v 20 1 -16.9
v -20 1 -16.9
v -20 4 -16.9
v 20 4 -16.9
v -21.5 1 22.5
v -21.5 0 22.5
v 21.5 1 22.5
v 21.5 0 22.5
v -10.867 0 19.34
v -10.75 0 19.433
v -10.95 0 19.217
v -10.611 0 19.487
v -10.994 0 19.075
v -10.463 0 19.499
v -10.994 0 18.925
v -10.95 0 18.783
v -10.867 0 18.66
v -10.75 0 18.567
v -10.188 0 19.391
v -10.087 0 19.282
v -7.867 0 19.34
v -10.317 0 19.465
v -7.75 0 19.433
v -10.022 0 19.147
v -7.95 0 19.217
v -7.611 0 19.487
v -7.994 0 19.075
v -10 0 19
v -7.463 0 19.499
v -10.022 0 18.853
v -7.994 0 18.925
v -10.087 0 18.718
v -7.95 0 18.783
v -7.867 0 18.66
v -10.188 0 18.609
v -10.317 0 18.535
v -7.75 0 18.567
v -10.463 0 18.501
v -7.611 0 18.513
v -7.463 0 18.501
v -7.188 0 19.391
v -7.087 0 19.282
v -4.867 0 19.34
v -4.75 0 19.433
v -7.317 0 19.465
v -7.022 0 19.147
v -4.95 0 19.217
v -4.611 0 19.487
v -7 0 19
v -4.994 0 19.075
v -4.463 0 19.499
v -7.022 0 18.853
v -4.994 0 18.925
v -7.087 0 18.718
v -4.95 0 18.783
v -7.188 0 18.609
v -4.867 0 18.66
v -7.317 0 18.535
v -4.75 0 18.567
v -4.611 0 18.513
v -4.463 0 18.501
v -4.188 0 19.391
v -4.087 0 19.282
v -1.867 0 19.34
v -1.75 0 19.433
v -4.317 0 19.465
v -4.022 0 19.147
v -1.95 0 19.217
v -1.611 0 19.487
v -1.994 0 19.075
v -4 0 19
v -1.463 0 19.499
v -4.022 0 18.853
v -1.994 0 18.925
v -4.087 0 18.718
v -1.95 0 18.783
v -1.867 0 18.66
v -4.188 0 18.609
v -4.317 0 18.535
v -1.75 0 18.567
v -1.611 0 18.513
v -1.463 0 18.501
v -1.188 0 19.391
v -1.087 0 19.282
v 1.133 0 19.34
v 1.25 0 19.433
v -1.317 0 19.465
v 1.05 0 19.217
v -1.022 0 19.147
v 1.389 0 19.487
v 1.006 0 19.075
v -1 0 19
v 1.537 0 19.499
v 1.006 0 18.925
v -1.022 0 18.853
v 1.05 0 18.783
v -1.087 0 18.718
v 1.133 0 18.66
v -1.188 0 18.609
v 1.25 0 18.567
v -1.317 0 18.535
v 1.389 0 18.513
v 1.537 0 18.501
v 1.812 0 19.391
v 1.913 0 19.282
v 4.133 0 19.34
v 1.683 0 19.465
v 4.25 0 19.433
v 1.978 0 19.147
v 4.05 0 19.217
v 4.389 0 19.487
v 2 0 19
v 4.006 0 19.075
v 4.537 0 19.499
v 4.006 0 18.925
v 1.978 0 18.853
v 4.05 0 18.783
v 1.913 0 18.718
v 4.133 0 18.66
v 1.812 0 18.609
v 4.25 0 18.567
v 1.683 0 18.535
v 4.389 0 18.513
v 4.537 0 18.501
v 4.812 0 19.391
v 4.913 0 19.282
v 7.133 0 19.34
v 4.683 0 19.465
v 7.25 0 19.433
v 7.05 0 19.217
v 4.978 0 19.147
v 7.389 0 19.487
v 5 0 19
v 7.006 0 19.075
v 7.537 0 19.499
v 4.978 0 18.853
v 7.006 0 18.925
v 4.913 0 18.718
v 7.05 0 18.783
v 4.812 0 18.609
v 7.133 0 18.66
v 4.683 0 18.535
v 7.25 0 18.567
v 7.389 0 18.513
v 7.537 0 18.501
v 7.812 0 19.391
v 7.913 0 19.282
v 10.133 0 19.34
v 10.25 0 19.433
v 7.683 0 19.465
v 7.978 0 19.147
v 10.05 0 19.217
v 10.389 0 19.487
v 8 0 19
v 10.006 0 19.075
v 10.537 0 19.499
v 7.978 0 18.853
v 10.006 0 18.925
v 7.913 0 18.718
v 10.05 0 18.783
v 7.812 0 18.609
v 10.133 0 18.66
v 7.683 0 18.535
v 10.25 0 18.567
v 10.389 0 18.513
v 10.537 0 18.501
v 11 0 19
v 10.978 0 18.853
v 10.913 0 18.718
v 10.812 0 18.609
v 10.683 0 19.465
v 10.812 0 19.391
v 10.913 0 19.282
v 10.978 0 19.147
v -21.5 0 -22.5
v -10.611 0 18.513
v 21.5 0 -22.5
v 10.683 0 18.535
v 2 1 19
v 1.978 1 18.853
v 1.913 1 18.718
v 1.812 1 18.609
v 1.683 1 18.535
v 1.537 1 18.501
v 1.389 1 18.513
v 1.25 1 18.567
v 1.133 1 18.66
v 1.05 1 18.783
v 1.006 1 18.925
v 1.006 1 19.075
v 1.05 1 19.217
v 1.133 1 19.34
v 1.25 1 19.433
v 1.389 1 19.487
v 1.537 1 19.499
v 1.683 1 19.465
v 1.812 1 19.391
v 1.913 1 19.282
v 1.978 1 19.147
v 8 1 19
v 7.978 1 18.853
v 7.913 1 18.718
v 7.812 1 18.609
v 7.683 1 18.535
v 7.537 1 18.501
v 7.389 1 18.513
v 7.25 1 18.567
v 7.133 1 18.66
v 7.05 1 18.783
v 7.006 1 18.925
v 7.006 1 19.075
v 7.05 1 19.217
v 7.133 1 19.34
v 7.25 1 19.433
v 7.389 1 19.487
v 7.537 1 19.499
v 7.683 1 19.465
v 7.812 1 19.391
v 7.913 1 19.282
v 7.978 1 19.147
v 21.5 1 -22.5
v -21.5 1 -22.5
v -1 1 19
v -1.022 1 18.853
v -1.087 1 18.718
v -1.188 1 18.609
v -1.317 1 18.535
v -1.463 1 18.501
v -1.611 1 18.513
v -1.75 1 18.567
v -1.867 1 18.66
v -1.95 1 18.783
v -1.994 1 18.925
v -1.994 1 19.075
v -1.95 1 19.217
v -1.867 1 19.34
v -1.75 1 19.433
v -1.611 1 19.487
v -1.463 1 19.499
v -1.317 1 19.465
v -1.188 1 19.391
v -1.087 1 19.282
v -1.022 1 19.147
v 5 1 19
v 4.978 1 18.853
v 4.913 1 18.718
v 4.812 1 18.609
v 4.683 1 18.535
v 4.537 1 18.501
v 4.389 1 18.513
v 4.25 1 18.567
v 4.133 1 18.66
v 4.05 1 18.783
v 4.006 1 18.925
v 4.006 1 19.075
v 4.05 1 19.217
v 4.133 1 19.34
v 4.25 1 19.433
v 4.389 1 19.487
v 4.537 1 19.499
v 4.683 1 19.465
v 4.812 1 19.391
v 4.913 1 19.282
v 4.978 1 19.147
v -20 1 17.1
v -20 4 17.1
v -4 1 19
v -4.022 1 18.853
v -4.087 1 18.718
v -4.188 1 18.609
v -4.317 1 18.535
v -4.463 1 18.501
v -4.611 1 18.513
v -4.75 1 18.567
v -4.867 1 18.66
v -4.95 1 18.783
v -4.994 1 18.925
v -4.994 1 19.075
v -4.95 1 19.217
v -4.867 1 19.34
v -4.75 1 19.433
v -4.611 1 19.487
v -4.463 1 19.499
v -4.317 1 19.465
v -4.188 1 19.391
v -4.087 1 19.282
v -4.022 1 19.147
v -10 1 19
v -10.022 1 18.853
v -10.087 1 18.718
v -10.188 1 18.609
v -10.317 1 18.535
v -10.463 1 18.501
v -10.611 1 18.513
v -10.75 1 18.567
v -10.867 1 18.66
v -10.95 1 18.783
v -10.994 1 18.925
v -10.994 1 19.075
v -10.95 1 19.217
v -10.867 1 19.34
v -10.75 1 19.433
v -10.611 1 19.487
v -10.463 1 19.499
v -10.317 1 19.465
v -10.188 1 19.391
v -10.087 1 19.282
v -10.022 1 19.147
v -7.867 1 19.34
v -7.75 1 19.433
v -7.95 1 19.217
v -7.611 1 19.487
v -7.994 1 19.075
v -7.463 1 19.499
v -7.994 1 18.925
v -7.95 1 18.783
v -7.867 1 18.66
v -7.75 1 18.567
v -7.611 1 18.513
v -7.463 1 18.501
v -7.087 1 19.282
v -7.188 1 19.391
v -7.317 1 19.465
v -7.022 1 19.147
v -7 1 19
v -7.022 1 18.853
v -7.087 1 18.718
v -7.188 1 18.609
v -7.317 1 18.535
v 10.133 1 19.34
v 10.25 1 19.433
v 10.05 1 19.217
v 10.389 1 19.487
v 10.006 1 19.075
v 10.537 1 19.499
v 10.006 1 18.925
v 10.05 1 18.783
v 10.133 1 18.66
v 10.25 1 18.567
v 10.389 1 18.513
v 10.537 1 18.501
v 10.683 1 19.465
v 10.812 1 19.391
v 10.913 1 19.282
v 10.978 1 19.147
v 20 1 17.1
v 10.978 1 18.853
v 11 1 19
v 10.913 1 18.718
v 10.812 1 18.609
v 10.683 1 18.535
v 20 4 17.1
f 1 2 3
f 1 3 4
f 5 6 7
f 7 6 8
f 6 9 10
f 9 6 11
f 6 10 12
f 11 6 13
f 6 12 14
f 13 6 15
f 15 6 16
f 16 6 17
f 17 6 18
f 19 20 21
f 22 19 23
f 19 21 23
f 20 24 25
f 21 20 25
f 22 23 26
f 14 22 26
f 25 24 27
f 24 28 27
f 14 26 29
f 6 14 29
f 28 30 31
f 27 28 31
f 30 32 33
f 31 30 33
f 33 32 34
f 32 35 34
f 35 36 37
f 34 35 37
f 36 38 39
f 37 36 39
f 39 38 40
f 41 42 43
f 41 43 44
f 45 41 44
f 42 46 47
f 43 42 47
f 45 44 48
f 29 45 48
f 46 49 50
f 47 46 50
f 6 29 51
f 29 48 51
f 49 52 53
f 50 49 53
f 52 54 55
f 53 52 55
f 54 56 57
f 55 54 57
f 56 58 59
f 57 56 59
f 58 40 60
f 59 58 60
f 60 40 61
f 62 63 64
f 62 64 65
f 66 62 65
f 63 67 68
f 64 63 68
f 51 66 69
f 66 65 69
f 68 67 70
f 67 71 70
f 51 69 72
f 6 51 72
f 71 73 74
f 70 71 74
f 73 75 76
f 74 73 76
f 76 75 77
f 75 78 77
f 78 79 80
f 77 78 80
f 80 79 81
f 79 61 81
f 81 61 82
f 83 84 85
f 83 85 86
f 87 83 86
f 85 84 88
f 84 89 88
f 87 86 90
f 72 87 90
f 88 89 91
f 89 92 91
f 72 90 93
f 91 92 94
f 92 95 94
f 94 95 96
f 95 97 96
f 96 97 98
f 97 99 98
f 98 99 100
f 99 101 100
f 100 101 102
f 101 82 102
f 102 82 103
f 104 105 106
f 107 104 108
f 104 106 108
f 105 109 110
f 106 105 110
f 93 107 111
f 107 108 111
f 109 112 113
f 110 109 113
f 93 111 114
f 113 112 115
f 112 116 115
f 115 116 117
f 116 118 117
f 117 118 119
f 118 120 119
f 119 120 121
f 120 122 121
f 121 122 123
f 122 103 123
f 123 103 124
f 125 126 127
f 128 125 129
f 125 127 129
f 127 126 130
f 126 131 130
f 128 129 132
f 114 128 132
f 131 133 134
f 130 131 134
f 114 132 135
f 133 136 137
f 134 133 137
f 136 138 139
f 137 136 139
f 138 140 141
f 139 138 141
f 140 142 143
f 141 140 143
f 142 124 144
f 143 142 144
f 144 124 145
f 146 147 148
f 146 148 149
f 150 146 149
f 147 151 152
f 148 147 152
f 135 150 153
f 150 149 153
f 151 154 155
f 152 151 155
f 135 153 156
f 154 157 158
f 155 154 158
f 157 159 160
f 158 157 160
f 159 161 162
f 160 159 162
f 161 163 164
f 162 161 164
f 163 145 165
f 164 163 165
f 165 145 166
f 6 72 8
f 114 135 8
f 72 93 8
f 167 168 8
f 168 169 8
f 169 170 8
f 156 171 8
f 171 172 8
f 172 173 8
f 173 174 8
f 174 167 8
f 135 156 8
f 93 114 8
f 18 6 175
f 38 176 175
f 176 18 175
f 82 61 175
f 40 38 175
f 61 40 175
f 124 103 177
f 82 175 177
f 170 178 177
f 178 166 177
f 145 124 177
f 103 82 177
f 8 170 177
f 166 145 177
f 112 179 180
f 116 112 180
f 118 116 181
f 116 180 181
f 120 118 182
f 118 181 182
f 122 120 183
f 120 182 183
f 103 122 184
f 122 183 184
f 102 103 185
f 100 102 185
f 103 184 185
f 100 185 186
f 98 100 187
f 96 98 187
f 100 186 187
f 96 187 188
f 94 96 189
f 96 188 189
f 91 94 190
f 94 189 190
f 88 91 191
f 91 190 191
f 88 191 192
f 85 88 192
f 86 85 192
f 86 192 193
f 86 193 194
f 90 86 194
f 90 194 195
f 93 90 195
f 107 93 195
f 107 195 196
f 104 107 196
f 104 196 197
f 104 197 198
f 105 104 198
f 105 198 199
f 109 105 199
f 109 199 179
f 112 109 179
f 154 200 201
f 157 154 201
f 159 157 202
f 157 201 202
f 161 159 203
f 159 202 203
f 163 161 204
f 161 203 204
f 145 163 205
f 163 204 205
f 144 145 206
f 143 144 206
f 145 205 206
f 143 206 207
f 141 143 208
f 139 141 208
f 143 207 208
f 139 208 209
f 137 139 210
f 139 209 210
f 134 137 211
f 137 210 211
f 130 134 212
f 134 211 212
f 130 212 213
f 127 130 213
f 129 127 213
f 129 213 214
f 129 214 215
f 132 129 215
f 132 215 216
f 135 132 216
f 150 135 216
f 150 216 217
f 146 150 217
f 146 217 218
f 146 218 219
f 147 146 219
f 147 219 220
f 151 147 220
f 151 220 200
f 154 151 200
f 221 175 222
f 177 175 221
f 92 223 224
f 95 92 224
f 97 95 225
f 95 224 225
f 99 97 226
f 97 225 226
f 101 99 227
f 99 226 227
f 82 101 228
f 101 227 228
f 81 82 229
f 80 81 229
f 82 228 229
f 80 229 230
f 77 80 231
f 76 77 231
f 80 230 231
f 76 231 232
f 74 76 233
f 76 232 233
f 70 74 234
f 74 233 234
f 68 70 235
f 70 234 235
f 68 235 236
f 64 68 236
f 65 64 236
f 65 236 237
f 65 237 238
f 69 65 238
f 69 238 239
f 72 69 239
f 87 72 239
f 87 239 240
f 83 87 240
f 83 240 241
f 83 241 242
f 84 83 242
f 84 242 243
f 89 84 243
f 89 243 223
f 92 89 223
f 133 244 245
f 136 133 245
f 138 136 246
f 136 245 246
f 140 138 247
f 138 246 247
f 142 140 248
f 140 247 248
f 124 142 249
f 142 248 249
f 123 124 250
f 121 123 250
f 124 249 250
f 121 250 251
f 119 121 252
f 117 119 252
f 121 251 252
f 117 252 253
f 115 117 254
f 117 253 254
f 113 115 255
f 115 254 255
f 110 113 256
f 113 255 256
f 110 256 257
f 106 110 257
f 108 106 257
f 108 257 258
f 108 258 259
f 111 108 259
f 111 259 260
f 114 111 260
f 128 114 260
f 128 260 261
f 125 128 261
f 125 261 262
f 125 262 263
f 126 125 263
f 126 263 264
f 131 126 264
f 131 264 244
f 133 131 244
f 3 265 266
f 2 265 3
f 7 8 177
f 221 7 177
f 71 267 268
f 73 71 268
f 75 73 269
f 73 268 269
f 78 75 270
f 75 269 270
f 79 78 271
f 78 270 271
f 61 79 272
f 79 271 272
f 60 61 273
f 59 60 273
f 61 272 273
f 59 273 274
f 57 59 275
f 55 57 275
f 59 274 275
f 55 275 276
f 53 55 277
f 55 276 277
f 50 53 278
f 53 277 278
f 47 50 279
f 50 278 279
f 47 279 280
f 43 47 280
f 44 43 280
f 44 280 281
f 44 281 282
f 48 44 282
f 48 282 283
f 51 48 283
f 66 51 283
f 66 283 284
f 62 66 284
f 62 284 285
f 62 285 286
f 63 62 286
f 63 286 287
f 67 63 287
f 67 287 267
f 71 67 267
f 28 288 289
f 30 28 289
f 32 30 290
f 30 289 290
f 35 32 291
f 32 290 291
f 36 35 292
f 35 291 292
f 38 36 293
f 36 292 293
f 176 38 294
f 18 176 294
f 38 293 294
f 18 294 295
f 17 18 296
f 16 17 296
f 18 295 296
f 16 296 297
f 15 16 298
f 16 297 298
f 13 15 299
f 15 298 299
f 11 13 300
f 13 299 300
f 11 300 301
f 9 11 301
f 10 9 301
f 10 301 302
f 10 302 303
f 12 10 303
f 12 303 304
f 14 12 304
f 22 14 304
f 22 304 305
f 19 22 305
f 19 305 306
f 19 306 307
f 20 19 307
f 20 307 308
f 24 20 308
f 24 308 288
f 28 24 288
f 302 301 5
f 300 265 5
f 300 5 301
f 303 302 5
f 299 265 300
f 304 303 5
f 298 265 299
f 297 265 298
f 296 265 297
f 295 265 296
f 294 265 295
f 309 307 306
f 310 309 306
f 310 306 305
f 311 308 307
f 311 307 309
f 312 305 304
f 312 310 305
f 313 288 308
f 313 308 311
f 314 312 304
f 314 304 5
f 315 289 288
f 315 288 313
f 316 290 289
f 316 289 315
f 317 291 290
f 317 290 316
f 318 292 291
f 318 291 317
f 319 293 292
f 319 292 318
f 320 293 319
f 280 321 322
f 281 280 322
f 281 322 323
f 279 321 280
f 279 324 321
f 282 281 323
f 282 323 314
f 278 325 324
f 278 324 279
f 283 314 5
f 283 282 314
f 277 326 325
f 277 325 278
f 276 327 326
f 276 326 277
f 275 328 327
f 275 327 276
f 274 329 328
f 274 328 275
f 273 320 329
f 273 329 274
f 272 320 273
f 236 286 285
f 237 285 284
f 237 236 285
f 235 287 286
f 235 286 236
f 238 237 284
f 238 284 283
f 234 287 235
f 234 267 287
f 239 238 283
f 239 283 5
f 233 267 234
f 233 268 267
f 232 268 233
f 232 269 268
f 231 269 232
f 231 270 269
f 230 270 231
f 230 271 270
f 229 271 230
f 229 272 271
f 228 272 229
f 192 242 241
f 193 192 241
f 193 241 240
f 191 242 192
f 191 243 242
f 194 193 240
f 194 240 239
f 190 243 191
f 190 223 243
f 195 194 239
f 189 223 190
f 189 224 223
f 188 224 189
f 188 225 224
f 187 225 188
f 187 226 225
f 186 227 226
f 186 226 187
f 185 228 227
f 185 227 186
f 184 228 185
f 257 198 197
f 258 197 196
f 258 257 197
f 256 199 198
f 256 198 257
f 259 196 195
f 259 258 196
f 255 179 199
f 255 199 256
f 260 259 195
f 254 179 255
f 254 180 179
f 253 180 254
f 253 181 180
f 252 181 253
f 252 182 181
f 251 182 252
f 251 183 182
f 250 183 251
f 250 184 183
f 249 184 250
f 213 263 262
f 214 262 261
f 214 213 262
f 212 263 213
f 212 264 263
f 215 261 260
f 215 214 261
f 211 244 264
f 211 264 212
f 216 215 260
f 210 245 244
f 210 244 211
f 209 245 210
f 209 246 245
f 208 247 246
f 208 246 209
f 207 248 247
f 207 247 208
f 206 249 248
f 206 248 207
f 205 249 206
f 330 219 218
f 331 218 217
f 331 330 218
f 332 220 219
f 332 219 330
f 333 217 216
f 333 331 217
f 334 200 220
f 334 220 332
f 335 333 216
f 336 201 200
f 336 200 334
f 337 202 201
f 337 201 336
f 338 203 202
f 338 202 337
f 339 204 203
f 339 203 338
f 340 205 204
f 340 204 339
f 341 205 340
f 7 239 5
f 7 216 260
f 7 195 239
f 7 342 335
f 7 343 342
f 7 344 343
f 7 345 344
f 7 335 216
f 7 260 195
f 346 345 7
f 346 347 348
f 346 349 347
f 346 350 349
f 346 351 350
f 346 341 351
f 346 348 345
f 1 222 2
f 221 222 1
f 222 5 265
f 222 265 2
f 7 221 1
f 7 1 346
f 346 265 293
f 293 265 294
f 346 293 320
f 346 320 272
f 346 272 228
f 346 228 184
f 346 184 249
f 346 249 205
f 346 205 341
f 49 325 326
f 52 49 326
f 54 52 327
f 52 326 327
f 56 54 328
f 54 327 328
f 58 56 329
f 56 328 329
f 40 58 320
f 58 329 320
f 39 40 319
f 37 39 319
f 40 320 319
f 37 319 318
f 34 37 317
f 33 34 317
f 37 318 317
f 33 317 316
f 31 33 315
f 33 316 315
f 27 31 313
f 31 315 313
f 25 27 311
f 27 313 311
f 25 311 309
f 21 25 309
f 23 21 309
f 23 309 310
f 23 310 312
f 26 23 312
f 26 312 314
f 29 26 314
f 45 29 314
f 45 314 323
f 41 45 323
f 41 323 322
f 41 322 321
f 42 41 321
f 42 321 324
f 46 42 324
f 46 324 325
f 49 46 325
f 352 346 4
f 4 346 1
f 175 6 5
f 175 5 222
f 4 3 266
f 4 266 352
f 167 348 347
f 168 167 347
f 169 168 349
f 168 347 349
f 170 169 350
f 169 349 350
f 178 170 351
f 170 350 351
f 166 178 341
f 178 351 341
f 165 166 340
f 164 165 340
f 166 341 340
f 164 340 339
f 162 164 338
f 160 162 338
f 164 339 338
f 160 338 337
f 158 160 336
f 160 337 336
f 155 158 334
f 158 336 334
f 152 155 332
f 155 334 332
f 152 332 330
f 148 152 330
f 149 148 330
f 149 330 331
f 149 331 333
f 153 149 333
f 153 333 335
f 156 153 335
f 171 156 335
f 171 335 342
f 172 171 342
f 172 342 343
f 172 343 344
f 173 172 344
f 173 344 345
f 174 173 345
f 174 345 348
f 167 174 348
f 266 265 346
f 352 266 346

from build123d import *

# Parameters (mm, degrees)
CROQUIS1_W              = 43
CROQUIS1_H              = 45
SALIENTE_EXTRUIR1_DEPTH = 1
CROQUIS2_W              = 40
CROQUIS2_H              = 34
SALIENTE_EXTRUIR2_DEPTH = 3
CROQUIS3_R              = 0.5
CORTAR_EXTRUIR1_DEPTH   = 2


with BuildPart() as part:
    # Croquis1 → Saliente-Extruir1 (new body)
    with BuildSketch(Plane(origin=(0, 0, 0), x_dir=(1, 0, 0), z_dir=(0, 1, 0))):
        Rectangle(CROQUIS1_W, CROQUIS1_H)
    extrude(amount=SALIENTE_EXTRUIR1_DEPTH)

    # Croquis2 → Saliente-Extruir2 (add)
    with BuildSketch(Plane(origin=(0, 1, 0), x_dir=(1, 0, 0), z_dir=(0, 1, 0))):
        with Locations((0, -0.1)):
            Rectangle(CROQUIS2_W, CROQUIS2_H)
    extrude(amount=SALIENTE_EXTRUIR2_DEPTH)

    # Croquis3 → Cortar-Extruir1 (cut, through all)
    with BuildSketch(Plane(origin=(0, 1, 0), x_dir=(1, 0, 0), z_dir=(0, 1, 0))):
        with Locations((1.5, -19)):
            Circle(CROQUIS3_R)
        with Locations((4.5, -19)):
            Circle(CROQUIS3_R)
        with Locations((7.5, -19)):
            Circle(CROQUIS3_R)
        with Locations((10.5, -19)):
            Circle(CROQUIS3_R)
        with Locations((-10.5, -19)):
            Circle(CROQUIS3_R)
        with Locations((-7.5, -19)):
            Circle(CROQUIS3_R)
        with Locations((-4.5, -19)):
            Circle(CROQUIS3_R)
        with Locations((-1.5, -19)):
            Circle(CROQUIS3_R)
    extrude(amount=-CORTAR_EXTRUIR1_DEPTH, mode=Mode.SUBTRACT)


solid = part.part
